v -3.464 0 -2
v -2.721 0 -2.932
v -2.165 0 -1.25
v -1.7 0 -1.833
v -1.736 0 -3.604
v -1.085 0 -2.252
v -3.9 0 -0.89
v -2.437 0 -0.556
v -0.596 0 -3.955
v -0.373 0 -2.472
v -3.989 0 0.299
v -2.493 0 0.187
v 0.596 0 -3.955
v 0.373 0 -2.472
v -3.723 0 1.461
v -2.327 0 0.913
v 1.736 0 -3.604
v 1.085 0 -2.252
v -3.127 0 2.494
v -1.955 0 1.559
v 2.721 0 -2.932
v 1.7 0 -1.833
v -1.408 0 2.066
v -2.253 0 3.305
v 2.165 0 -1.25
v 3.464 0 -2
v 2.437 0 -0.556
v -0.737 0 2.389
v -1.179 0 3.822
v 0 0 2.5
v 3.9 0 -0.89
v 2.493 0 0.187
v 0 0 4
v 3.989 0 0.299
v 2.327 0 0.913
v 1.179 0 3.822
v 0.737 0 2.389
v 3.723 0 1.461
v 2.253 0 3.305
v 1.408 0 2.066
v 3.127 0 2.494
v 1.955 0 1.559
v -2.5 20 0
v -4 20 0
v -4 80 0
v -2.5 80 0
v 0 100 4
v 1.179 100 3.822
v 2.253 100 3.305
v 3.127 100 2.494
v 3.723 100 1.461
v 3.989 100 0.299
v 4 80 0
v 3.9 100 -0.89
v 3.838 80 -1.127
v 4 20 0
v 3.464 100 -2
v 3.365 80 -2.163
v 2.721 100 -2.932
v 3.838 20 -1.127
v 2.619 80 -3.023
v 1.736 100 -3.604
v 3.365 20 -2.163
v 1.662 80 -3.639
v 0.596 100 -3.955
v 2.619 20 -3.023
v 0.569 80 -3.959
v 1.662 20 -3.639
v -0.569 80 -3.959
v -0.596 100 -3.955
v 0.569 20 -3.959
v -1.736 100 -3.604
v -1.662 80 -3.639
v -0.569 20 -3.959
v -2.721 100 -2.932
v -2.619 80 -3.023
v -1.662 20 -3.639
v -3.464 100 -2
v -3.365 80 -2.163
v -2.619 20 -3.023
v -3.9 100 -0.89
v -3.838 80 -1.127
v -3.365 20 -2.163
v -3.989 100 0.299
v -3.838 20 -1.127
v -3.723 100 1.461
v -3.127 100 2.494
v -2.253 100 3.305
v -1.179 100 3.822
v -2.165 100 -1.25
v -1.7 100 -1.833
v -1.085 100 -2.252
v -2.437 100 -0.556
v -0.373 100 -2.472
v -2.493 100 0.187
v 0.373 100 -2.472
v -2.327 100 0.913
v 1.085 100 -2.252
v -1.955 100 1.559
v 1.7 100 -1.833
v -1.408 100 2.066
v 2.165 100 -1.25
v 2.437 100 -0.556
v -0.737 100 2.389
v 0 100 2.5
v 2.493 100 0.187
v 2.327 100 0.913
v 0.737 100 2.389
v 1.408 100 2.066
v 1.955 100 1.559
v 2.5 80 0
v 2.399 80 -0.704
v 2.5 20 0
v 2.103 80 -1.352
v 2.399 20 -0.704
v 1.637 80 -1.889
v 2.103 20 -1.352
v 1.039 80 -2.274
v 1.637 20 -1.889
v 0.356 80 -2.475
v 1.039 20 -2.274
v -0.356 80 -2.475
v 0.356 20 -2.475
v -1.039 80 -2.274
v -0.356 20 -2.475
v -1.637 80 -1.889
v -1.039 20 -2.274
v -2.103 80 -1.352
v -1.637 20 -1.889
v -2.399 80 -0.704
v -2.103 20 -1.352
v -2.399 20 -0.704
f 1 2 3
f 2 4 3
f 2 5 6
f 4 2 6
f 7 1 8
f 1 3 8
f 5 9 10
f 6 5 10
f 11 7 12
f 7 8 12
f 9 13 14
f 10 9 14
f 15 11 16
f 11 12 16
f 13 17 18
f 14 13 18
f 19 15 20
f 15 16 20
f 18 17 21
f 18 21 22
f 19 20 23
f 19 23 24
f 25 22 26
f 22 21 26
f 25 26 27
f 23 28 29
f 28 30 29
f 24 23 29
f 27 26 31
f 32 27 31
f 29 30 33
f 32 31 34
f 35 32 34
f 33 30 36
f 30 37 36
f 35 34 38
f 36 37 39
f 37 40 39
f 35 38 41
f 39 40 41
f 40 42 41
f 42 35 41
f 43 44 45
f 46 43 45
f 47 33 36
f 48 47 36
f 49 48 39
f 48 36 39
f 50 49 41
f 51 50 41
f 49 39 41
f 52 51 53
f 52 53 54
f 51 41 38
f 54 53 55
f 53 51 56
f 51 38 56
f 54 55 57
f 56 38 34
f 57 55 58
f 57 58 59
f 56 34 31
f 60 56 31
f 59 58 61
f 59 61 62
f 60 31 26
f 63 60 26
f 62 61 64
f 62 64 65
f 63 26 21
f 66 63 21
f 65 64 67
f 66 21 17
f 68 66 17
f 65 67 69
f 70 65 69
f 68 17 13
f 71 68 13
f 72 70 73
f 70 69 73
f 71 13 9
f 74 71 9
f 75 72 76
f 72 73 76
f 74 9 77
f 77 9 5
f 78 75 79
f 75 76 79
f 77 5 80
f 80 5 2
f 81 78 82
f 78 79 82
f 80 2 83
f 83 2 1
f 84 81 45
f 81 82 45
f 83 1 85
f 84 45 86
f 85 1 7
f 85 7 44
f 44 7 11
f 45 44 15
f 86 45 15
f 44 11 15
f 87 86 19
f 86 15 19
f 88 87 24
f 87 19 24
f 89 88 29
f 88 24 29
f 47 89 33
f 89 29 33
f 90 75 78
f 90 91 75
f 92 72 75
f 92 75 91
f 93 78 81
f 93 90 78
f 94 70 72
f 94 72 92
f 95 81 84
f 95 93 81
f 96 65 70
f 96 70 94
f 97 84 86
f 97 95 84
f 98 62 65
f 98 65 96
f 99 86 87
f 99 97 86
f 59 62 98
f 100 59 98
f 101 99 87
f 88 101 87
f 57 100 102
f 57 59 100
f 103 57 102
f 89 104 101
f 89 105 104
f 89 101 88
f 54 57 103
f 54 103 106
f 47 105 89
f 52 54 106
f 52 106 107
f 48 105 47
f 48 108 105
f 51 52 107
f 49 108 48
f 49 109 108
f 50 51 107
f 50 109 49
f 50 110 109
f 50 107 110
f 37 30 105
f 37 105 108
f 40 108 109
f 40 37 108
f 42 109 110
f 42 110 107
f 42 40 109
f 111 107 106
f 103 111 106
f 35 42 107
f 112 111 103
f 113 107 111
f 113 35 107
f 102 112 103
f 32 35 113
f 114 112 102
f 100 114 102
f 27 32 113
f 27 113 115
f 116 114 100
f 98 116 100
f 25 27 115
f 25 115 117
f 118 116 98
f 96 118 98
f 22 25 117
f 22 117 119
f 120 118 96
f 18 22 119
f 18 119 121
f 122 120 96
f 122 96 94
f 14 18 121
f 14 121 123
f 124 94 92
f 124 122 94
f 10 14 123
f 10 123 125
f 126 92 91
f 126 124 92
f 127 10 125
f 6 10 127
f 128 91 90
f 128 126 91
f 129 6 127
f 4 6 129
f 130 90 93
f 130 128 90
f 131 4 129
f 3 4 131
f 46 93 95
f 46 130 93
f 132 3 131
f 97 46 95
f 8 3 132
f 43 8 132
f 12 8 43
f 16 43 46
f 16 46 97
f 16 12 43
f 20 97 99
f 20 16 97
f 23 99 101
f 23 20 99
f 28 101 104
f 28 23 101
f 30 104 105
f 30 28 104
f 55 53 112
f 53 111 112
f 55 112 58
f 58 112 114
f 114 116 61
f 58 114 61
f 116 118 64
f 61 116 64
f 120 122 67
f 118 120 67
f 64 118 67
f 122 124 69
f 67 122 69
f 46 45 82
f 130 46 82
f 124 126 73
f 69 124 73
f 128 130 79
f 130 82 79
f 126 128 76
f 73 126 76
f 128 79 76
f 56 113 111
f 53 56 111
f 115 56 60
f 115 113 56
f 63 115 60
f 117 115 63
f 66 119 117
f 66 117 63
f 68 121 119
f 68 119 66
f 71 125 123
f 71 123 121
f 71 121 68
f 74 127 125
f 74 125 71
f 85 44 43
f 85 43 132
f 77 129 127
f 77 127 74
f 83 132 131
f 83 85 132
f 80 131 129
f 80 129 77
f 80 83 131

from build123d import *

# Parameters (mm, degrees)
SKETCH_1_R               = 4
SKETCH_1_R_2             = 2.5
EXTRUDE_1_DEPTH          = 100
CUT_EXTRUDE_1_DEPTH      = 101.159872204
CUT_EXTRUDE_1_DEPTH_BACK = 101.159872204
SKETCH_2_W               = 8
SKETCH_2_H               = 60


with BuildPart() as part:
    # 草图1 → 凸台-拉伸1 (new body)
    with BuildSketch(Plane(origin=(0, 0, 0), x_dir=(1, 0, 0), z_dir=(0, 1, 0))):
        with Locations(Location((0, 0, 0), (0, 0, 270))):
            Circle(SKETCH_1_R)
        with Locations(Location((0, 0, 0), (0, 0, 270))):
            Circle(SKETCH_1_R_2, mode=Mode.SUBTRACT)
    extrude(amount=EXTRUDE_1_DEPTH)

    # 草图2 → 切除-拉伸1 (cut, two sides: drawn at the far end of the back side and taken through both)
    with BuildSketch(Plane(origin=(0, 0, 0), x_dir=(0, 0, -1), z_dir=(1, 0, 0)).offset(-CUT_EXTRUDE_1_DEPTH_BACK)):
        with Locations((4, 50)):
            Rectangle(SKETCH_2_W, SKETCH_2_H)
    extrude(amount=CUT_EXTRUDE_1_DEPTH + CUT_EXTRUDE_1_DEPTH_BACK, mode=Mode.SUBTRACT)


solid = part.part
